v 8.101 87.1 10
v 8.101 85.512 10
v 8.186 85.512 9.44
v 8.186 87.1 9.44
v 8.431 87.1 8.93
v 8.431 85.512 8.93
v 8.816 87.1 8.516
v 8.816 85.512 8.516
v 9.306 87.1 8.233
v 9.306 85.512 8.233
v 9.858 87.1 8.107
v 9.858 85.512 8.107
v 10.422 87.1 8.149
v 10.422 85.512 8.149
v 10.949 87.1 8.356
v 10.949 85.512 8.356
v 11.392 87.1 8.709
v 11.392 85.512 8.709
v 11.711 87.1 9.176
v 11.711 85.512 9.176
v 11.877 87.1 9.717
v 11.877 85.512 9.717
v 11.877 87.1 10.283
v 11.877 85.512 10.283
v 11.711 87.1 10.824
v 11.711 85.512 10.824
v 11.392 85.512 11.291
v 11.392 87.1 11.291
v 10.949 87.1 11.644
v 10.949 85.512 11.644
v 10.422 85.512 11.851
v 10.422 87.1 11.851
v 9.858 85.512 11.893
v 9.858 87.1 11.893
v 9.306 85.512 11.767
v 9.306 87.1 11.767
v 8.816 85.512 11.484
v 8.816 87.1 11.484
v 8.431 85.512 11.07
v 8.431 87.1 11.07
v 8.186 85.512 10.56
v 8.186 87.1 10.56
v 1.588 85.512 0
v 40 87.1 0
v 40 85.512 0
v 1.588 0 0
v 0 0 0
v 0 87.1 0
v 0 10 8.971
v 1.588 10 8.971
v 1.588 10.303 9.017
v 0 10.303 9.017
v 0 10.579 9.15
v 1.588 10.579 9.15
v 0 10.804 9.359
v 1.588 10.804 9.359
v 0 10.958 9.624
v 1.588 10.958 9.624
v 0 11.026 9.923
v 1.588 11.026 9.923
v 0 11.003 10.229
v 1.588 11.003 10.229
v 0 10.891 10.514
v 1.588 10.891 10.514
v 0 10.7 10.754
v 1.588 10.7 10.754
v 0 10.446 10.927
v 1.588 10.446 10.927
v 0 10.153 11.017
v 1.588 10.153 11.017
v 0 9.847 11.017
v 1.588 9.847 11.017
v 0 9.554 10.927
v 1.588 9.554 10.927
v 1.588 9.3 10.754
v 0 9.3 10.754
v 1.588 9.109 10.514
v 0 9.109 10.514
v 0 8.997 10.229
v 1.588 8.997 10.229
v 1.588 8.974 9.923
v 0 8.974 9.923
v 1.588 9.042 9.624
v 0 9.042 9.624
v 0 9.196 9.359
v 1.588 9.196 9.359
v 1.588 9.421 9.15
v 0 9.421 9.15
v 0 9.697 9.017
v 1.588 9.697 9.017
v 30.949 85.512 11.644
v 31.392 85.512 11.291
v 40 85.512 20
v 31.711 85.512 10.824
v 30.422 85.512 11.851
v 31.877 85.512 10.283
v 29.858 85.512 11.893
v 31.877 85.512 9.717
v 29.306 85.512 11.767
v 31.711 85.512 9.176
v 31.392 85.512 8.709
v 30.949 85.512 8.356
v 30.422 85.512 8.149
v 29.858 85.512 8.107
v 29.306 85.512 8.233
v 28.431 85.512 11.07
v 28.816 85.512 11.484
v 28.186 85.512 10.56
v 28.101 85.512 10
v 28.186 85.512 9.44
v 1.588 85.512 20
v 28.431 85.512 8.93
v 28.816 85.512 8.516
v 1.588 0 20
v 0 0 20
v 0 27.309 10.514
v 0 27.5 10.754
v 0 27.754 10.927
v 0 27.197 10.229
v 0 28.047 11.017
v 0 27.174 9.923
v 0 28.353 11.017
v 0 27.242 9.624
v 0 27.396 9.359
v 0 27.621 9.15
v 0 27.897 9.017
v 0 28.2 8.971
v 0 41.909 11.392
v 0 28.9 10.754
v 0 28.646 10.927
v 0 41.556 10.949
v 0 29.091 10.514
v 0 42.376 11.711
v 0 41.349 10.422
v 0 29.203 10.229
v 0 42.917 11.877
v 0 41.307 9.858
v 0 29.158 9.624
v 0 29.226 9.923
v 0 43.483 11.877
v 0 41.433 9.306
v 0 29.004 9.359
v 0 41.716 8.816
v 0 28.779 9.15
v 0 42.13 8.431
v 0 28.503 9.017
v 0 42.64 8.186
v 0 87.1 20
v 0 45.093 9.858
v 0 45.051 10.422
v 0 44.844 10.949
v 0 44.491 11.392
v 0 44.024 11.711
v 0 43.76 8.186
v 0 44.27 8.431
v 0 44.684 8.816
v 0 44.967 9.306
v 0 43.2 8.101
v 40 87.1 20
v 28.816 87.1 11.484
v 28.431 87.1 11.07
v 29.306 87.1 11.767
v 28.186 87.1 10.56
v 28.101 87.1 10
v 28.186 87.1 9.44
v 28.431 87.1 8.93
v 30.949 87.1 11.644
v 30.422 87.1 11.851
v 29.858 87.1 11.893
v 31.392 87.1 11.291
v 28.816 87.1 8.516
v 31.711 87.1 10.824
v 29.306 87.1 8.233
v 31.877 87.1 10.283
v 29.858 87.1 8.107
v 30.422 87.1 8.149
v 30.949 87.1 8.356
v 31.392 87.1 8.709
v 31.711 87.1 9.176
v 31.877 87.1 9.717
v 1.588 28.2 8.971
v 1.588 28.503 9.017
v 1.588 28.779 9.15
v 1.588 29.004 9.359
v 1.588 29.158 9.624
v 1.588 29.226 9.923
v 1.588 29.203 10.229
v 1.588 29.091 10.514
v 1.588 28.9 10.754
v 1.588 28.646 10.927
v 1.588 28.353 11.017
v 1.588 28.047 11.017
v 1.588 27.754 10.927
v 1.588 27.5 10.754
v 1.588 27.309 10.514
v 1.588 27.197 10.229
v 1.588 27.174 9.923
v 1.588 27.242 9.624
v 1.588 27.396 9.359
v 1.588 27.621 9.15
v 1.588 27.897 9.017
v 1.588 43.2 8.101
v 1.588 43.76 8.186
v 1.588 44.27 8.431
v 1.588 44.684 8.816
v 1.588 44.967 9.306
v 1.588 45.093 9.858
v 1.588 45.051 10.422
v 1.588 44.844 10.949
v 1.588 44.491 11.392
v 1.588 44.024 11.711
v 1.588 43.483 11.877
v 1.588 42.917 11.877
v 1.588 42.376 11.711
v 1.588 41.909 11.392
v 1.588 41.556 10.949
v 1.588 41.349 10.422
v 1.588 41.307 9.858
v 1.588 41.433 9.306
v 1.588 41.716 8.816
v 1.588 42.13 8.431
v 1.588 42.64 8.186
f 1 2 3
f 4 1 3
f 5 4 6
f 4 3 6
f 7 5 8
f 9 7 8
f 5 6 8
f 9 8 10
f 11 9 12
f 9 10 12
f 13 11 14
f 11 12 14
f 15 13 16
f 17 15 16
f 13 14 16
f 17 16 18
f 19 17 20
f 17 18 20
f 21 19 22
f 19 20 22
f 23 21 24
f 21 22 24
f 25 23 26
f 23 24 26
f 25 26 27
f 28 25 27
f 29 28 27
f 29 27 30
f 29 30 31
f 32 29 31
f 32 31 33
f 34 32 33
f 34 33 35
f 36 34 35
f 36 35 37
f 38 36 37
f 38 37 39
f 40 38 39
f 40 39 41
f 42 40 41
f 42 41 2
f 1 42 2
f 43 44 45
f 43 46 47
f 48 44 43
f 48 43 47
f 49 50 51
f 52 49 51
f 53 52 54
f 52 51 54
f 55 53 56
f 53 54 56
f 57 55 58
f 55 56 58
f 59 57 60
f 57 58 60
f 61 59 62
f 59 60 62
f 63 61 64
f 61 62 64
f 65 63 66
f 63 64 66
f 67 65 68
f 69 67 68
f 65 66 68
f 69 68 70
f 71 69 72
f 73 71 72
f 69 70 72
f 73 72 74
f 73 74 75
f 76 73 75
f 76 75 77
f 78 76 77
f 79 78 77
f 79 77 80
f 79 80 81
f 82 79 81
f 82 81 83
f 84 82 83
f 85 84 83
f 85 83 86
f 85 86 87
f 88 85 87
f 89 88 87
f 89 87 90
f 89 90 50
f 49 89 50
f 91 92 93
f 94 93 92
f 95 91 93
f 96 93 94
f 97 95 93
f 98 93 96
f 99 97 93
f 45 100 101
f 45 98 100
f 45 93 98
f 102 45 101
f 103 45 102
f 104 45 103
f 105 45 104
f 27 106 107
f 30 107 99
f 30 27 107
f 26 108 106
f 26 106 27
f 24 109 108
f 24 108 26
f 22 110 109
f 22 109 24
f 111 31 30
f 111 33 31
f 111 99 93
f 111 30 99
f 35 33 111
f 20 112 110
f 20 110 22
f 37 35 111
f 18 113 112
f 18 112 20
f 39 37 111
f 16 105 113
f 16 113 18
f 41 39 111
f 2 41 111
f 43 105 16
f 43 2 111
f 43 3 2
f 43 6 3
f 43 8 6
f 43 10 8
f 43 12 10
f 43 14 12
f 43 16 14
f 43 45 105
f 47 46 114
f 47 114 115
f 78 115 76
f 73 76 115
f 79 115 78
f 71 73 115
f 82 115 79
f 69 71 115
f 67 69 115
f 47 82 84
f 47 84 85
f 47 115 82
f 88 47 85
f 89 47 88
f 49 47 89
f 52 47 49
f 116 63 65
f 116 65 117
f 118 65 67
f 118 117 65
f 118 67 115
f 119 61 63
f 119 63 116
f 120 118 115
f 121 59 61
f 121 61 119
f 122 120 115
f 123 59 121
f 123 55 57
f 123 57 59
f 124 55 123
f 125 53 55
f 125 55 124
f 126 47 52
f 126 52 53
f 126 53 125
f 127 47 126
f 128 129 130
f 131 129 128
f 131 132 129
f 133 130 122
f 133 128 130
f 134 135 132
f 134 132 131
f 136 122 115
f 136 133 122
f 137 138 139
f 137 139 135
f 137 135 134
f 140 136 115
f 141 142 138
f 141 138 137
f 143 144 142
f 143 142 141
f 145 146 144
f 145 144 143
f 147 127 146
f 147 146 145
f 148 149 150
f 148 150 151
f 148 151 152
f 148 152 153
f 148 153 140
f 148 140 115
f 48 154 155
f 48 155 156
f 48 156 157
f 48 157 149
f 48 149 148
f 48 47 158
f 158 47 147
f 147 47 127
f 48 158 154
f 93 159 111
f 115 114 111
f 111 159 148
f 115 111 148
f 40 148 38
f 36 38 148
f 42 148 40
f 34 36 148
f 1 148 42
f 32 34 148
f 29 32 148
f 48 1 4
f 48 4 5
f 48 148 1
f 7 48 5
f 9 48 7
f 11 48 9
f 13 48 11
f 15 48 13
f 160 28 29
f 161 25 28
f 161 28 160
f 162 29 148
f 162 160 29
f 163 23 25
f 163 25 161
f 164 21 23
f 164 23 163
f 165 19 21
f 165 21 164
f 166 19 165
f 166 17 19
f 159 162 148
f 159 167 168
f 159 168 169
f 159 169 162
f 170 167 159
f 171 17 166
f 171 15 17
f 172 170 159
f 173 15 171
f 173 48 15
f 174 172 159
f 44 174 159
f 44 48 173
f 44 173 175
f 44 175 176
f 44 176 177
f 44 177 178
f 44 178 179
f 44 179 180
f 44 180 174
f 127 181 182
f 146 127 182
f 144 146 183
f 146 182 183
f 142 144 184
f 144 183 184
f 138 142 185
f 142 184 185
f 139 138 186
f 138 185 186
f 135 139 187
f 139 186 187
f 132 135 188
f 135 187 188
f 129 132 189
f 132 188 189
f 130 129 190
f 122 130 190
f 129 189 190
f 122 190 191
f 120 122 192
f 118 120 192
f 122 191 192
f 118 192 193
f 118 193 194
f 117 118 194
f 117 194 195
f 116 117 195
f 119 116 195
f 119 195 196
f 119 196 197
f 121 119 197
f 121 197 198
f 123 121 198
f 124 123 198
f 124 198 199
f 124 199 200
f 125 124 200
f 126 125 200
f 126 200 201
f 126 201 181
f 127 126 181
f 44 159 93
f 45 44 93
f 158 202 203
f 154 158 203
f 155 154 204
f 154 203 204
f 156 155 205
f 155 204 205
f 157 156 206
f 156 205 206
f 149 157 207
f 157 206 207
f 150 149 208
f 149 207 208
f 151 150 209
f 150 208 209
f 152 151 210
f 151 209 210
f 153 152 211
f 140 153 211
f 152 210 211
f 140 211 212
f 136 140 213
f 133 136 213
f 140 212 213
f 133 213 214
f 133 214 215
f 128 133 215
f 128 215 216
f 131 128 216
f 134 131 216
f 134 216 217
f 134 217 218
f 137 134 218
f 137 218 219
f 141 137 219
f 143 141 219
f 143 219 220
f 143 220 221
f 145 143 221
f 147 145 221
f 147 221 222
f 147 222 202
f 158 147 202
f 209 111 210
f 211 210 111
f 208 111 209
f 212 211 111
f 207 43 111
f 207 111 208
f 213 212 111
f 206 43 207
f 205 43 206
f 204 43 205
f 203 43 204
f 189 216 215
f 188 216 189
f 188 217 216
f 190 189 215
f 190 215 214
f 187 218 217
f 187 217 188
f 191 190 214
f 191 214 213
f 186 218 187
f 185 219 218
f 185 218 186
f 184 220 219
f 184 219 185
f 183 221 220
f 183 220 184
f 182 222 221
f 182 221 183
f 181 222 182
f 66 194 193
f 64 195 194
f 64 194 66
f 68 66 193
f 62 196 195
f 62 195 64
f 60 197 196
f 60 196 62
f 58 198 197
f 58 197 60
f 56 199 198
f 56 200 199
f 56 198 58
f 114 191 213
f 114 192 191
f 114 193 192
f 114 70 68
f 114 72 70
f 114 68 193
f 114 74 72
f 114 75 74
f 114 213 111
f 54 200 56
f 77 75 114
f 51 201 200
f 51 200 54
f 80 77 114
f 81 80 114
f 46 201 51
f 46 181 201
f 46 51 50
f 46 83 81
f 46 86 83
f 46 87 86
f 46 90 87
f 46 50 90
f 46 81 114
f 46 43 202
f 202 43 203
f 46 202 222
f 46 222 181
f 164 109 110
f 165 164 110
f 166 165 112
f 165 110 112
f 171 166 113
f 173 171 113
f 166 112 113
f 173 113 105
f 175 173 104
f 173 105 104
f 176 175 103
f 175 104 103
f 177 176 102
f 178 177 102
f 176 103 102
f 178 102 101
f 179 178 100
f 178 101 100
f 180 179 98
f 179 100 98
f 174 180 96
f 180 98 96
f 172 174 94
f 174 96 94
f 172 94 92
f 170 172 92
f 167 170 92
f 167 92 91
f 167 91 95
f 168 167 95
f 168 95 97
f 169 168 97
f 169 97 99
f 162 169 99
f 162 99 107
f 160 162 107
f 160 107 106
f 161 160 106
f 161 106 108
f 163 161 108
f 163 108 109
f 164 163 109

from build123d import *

# Parameters (mm, degrees)
BOSS_EXTRUDE1_DEPTH   = 20
F_6_CLEARANCE_HOLE1_D = 3.7973
F_1_CLEARANCE_HOLE2_D = 2.0574
F_6_CLEARANCE_HOLE2_D = 3.7973


with BuildPart() as part:
    # Sketch2 → Boss-Extrude1 (new body)
    with BuildSketch(Plane.XY):
        Polygon((0, 0), (0, 87.1), (40, 87.1), (40, 85.5125), (1.5875, 85.5125), (1.5875, 0), align=None)
    extrude(amount=BOSS_EXTRUDE1_DEPTH)

    # #6 Clearance Hole1 (through all)
    with Locations(Plane(origin=(0, 87.1, 0), x_dir=(1, 0, 0), z_dir=(0, 1, 0))):
        with Locations((10, -10), (30, -10)):
            Hole(F_6_CLEARANCE_HOLE1_D / 2)

    # #1 Clearance Hole2 (through all)
    with Locations(Plane.ZY):
        with Locations((10, 10), (10, 28.2)):
            Hole(F_1_CLEARANCE_HOLE2_D / 2)

    # #6 Clearance Hole2 (through all)
    with Locations(Plane.ZY):
        with Locations((10, 43.2)):
            Hole(F_6_CLEARANCE_HOLE2_D / 2)


solid = part.part
